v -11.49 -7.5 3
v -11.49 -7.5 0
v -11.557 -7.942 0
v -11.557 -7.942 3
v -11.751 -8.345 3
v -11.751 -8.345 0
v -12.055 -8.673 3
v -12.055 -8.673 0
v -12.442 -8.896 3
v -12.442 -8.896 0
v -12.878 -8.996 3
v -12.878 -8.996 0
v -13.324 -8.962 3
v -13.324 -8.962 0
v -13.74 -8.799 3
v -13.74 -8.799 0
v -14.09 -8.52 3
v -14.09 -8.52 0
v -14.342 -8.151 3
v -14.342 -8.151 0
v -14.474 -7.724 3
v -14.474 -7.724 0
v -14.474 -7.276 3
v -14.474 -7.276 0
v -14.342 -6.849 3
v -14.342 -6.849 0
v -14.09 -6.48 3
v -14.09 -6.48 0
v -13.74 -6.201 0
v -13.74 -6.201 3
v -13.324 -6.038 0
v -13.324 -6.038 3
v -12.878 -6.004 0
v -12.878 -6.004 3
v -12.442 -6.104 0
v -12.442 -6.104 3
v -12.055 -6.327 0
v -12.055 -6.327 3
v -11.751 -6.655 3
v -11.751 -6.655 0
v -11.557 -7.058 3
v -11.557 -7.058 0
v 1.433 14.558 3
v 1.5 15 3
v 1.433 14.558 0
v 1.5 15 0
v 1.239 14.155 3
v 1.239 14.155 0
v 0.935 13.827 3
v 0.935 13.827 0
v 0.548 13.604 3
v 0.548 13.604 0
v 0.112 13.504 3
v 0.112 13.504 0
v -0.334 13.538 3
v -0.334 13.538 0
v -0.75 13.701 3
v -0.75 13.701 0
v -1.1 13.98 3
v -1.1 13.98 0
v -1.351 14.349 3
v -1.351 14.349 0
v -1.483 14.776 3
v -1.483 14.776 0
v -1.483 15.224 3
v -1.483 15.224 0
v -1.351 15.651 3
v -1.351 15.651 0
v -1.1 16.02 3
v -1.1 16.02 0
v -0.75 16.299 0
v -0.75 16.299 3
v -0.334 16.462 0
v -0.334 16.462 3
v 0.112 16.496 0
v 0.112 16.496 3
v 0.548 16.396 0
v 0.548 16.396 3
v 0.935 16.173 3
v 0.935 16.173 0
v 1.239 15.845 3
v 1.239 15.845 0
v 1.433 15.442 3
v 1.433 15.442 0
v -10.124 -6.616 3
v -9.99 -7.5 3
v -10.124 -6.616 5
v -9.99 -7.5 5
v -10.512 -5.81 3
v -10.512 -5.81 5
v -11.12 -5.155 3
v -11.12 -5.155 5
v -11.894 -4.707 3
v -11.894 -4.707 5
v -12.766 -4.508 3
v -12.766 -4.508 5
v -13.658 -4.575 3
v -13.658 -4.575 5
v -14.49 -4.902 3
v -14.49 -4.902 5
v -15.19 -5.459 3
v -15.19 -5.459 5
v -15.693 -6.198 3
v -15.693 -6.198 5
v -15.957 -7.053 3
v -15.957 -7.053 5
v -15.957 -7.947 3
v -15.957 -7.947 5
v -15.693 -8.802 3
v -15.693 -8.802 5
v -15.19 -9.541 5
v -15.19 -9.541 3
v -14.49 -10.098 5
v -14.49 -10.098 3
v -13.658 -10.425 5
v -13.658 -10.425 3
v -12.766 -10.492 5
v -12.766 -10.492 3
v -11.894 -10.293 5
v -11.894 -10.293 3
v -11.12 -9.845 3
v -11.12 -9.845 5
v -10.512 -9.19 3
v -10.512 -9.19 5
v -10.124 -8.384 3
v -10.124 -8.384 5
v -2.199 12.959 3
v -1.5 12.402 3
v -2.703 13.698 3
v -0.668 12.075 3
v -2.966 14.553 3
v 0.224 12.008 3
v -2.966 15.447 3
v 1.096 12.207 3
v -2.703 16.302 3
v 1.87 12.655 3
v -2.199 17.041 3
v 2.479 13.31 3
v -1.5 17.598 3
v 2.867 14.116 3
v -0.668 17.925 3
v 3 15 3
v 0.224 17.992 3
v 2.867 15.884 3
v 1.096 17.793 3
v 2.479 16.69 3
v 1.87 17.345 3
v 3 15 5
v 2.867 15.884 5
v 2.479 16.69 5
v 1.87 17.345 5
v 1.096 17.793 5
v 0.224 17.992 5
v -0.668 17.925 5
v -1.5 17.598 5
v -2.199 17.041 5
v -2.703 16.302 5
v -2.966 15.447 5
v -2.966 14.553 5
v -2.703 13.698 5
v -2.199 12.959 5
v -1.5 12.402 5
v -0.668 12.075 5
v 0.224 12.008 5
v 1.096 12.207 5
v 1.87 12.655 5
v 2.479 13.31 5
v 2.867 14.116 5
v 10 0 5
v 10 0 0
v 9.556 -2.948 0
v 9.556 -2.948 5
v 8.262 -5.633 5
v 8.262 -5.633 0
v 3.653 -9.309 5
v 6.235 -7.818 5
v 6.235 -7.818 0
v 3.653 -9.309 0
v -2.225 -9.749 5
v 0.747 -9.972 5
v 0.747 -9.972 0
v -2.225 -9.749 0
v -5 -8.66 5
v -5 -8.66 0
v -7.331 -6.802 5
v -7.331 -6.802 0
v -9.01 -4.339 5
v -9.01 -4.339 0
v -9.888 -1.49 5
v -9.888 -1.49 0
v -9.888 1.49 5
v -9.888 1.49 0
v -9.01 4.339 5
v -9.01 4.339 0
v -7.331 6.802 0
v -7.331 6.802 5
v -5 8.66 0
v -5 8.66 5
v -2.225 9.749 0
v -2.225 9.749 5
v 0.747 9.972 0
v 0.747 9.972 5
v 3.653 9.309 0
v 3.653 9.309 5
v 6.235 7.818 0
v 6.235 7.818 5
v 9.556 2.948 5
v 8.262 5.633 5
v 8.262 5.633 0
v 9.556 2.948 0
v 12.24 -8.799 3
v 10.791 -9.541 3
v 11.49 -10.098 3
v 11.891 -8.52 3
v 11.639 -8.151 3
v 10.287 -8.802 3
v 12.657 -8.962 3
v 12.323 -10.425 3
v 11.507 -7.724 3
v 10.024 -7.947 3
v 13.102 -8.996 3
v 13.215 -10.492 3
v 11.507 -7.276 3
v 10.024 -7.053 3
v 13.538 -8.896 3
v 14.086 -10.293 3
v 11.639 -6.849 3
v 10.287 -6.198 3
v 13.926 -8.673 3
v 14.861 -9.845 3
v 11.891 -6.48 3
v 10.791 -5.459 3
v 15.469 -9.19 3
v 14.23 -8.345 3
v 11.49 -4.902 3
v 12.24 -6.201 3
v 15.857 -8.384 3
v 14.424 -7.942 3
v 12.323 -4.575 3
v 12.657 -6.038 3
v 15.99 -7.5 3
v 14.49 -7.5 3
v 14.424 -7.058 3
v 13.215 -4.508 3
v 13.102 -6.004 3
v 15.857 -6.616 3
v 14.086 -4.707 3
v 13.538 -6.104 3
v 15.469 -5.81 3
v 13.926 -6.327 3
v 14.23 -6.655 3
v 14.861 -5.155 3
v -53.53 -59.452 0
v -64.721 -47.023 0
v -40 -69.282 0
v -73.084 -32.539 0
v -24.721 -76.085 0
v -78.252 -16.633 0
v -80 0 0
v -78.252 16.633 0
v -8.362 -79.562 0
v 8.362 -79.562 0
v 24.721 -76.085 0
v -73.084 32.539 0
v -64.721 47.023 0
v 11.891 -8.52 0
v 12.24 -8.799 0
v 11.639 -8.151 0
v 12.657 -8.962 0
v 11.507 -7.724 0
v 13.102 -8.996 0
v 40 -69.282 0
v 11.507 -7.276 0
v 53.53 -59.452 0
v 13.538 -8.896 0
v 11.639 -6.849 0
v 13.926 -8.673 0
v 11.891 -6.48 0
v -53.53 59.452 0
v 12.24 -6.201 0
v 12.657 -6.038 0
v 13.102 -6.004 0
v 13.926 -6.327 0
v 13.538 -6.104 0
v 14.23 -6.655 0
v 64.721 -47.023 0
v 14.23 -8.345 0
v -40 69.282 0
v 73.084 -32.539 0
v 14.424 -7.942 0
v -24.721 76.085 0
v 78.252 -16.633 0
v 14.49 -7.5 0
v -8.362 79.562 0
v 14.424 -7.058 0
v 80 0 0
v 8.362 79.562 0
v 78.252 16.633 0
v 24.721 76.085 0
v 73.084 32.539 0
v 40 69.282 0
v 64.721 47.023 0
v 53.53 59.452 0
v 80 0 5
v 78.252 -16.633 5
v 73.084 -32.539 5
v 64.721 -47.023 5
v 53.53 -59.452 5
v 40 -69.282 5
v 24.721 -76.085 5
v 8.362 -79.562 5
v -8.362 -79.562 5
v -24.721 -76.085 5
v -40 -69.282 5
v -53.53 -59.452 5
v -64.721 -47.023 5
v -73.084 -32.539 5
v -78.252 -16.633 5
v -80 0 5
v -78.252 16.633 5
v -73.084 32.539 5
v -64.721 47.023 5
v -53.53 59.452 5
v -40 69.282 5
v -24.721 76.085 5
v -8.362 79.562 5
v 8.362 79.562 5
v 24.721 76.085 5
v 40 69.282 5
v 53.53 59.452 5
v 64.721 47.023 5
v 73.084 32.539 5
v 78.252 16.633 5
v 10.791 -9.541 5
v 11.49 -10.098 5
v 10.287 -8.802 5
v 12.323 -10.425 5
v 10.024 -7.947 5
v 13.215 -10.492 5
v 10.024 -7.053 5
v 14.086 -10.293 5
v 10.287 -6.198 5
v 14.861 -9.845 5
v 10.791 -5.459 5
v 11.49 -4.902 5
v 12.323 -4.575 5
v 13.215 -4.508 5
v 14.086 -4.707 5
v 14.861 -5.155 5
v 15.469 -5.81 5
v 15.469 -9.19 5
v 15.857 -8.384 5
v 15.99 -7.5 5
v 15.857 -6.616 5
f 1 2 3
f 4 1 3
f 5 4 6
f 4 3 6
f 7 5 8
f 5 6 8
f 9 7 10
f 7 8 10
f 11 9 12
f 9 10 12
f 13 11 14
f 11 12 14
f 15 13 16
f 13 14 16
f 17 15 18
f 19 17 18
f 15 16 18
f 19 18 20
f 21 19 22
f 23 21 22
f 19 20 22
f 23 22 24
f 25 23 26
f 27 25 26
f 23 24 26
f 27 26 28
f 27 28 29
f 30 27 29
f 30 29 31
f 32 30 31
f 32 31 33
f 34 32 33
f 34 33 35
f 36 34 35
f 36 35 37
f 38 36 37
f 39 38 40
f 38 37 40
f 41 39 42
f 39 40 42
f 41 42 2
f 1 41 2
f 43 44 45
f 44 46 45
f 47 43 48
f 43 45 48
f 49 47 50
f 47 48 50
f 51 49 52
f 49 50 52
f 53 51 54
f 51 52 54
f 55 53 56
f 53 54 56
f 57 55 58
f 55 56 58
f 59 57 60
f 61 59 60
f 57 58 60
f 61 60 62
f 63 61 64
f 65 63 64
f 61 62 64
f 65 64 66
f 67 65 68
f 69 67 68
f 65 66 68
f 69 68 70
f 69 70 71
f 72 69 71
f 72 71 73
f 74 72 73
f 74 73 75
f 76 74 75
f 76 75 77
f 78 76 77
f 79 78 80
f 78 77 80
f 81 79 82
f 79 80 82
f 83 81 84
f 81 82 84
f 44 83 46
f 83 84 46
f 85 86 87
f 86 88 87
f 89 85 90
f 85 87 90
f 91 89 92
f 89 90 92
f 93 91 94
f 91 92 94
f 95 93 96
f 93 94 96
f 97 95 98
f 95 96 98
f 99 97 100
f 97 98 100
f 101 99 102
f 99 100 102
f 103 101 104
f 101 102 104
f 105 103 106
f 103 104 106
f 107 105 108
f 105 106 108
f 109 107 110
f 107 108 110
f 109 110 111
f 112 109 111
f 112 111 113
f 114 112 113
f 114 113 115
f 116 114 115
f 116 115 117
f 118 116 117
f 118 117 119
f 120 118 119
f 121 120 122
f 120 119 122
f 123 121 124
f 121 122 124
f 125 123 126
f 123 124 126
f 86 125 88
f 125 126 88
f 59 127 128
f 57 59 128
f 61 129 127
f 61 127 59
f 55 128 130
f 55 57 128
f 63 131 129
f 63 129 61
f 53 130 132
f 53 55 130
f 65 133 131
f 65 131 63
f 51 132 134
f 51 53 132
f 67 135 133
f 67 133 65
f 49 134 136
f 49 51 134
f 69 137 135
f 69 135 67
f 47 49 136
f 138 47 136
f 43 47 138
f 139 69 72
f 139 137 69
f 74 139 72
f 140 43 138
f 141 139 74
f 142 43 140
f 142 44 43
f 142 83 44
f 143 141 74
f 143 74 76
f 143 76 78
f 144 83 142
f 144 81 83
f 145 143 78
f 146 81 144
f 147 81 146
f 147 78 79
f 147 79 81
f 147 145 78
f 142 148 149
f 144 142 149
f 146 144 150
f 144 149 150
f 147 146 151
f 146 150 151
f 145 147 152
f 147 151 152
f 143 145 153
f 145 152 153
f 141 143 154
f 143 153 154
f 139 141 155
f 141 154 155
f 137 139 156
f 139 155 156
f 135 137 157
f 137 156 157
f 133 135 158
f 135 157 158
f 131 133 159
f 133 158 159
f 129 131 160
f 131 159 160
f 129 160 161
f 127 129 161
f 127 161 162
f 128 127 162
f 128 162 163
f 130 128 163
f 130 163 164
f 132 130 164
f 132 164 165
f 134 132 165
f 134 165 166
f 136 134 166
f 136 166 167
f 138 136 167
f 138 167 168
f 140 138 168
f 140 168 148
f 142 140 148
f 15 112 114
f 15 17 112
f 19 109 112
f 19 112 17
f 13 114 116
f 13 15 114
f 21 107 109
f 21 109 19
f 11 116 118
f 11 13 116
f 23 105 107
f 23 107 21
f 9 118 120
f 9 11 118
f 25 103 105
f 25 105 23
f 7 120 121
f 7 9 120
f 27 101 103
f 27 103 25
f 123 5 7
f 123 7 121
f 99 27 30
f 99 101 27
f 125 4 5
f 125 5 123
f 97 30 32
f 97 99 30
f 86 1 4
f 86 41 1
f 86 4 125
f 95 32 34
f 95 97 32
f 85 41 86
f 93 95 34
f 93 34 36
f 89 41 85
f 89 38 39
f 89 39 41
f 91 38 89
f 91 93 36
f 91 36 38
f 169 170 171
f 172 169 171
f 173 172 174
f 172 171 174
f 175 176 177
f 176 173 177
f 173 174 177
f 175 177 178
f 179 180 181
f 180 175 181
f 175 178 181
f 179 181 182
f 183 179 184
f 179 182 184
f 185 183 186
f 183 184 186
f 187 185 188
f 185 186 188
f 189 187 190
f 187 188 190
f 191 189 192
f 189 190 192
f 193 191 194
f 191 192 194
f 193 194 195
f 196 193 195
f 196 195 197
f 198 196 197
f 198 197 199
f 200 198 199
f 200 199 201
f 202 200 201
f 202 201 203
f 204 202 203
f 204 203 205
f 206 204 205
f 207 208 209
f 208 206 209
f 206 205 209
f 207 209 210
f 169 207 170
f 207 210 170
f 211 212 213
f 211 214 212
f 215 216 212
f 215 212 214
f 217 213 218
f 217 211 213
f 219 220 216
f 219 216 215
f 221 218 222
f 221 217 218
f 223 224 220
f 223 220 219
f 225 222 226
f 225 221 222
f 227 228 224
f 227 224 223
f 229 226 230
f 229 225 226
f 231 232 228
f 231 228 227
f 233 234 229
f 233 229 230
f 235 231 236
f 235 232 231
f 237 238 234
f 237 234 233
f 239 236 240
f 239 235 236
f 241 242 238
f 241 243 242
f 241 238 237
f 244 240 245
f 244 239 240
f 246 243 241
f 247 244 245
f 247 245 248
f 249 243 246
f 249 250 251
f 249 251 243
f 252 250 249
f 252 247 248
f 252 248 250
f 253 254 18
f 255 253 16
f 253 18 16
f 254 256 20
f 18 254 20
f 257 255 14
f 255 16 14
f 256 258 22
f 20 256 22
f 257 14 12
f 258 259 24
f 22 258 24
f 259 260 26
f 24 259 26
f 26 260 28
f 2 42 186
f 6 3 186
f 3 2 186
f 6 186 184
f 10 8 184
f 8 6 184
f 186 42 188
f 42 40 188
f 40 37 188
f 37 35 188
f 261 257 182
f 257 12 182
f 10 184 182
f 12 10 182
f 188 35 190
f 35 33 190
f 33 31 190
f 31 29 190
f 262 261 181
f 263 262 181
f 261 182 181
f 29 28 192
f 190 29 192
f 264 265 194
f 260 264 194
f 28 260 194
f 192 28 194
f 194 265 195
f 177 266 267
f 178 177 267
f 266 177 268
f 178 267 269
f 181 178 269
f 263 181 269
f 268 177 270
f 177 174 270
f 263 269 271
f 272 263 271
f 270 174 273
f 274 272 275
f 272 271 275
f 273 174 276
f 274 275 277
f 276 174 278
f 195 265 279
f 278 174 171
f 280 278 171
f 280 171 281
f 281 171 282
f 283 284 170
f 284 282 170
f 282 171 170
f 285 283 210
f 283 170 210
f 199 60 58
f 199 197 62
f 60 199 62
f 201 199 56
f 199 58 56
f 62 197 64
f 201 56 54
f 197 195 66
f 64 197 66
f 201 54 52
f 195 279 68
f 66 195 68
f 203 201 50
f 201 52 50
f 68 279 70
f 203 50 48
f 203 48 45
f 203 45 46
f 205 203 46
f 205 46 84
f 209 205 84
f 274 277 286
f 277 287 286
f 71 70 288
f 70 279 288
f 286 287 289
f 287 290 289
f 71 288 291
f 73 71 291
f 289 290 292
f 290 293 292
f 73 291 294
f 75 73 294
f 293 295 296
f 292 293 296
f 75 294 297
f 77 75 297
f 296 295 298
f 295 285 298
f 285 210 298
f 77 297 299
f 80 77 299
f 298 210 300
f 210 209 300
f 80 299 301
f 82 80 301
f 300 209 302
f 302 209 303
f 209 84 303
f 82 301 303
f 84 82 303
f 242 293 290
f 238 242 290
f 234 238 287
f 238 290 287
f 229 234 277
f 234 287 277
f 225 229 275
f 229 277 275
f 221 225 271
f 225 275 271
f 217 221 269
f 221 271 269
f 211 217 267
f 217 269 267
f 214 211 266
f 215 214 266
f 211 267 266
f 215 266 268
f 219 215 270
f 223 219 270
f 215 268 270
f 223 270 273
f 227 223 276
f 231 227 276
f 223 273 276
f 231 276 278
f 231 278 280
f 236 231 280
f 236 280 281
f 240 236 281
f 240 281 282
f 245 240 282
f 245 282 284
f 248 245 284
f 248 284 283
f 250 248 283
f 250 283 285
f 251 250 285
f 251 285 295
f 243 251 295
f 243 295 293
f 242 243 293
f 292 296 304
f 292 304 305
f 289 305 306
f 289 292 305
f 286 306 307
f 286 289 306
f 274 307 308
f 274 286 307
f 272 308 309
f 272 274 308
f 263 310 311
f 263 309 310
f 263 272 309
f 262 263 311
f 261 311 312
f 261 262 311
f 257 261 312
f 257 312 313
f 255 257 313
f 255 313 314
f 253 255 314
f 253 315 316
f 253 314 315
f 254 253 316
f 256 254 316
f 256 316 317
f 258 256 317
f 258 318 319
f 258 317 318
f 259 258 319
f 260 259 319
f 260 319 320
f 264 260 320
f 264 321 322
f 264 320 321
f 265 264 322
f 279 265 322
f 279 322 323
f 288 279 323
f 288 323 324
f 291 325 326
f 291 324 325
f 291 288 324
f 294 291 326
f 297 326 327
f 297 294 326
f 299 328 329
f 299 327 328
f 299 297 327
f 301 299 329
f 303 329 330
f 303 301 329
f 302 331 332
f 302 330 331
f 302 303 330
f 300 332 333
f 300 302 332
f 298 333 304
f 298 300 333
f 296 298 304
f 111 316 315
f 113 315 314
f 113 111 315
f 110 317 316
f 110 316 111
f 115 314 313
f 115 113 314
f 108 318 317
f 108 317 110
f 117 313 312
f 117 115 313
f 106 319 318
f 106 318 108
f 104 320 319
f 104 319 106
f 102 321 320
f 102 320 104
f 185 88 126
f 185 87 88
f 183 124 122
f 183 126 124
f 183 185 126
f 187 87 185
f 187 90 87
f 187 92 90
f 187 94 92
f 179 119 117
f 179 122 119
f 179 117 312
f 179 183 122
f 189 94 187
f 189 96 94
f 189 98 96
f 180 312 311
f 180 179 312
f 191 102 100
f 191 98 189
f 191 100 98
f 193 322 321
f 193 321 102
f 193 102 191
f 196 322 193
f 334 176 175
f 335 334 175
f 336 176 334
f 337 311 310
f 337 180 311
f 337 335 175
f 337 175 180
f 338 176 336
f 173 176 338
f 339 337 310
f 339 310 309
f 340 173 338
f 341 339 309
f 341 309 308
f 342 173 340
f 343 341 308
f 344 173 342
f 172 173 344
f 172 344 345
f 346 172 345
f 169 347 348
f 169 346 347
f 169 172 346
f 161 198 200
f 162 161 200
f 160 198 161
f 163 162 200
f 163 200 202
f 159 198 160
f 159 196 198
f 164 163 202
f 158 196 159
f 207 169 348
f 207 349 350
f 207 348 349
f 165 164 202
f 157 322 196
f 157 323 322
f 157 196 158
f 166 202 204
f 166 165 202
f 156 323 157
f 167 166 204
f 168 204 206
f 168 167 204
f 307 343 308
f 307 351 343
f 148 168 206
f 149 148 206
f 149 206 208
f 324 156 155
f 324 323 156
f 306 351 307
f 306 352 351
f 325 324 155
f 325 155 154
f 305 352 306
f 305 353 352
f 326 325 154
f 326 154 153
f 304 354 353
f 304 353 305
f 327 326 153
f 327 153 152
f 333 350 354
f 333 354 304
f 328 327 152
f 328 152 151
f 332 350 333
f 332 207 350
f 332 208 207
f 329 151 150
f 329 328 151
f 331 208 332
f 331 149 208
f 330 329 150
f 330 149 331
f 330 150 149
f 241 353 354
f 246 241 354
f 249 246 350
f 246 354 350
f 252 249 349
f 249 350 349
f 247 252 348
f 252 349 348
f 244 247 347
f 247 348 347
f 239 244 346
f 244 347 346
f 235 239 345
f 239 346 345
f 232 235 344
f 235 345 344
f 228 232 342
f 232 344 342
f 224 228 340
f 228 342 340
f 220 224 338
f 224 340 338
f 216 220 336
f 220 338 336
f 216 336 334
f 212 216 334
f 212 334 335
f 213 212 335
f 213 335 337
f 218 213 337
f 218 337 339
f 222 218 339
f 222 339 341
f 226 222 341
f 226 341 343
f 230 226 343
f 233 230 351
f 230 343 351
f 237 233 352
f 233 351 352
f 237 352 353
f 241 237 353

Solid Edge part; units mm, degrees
sketch "Sketch1" plane through (0, 0, 0) normal (0, 0, 1) x (1, 0, 0)
  circle A0 centre (0, 0) radius 10
  circle A1 centre (-12.9904, -7.5) radius 1.5
  circle A2 centre (0, 15) radius 1.5
  circle A3 centre (12.9904, -7.5) radius 1.5
  circle A4 centre (0, 0) radius 80
extrude "Protrusion1" add sketch "Sketch1" along normal blind 5
sketch "Sketch2" plane through (0, 0, 5) normal (0, 0, 1) x (1, 0, 0)
  circle A0 centre (0, 15) radius 3
  circle A1 centre (-12.9904, -7.5) radius 3
  circle A2 centre (12.9904, -7.5) radius 3
  dimension "D1" = 6
extrude "ExtrudedCutout_1" cut sketch "Sketch2" against normal blind 2
extrude "ExtrudedCutout_2" [suppressed]
